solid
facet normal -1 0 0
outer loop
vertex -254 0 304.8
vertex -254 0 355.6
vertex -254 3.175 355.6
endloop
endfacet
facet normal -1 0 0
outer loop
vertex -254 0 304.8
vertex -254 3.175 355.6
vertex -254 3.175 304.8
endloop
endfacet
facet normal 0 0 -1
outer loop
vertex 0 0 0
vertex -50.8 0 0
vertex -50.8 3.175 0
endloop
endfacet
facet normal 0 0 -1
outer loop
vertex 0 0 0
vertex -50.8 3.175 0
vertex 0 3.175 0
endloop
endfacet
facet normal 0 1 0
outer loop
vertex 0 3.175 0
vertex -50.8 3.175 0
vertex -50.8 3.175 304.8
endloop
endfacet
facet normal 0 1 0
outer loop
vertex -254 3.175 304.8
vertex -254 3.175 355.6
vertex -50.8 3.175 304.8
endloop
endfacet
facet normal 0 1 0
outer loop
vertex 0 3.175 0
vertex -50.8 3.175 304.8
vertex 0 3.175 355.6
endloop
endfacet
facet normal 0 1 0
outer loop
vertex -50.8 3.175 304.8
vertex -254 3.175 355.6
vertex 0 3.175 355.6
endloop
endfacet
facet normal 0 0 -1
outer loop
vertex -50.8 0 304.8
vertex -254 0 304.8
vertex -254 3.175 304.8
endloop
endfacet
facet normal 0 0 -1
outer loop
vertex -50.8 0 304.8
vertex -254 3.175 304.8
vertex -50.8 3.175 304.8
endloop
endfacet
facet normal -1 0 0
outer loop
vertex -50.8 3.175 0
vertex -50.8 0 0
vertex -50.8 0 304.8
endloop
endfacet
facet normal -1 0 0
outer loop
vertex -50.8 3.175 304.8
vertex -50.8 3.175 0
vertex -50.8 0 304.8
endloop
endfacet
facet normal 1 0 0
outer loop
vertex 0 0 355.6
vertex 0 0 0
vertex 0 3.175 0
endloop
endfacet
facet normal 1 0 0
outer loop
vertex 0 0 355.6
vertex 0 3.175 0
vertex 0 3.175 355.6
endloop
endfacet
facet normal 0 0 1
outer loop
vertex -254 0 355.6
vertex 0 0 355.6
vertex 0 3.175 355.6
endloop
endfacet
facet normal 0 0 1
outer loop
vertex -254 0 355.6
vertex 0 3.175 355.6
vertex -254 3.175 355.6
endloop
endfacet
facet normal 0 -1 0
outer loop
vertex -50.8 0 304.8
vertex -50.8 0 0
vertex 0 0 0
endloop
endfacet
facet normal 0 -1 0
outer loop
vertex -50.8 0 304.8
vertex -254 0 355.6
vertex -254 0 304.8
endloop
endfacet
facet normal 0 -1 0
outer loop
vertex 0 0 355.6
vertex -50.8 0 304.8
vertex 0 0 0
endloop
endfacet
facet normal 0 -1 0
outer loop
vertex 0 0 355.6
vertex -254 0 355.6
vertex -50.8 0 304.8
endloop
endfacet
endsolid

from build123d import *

# Parameters (mm, degrees)
F0_W     = 50.8
F0_H     = 304.8
F1_DEPTH = 3.175


with BuildPart() as f1:
    # F0 (on Front) → F1 (new body)
    with BuildSketch(Plane.XZ):
        with Locations((-25.4, 152.4)):
            Rectangle(F0_W, F0_H)
        Polygon((-50.8, 304.8), (0, 304.8), (0, 355.6), (-254, 355.6), (-254, 304.8), align=None)
    extrude(amount=-F1_DEPTH)


solid = f1.part
